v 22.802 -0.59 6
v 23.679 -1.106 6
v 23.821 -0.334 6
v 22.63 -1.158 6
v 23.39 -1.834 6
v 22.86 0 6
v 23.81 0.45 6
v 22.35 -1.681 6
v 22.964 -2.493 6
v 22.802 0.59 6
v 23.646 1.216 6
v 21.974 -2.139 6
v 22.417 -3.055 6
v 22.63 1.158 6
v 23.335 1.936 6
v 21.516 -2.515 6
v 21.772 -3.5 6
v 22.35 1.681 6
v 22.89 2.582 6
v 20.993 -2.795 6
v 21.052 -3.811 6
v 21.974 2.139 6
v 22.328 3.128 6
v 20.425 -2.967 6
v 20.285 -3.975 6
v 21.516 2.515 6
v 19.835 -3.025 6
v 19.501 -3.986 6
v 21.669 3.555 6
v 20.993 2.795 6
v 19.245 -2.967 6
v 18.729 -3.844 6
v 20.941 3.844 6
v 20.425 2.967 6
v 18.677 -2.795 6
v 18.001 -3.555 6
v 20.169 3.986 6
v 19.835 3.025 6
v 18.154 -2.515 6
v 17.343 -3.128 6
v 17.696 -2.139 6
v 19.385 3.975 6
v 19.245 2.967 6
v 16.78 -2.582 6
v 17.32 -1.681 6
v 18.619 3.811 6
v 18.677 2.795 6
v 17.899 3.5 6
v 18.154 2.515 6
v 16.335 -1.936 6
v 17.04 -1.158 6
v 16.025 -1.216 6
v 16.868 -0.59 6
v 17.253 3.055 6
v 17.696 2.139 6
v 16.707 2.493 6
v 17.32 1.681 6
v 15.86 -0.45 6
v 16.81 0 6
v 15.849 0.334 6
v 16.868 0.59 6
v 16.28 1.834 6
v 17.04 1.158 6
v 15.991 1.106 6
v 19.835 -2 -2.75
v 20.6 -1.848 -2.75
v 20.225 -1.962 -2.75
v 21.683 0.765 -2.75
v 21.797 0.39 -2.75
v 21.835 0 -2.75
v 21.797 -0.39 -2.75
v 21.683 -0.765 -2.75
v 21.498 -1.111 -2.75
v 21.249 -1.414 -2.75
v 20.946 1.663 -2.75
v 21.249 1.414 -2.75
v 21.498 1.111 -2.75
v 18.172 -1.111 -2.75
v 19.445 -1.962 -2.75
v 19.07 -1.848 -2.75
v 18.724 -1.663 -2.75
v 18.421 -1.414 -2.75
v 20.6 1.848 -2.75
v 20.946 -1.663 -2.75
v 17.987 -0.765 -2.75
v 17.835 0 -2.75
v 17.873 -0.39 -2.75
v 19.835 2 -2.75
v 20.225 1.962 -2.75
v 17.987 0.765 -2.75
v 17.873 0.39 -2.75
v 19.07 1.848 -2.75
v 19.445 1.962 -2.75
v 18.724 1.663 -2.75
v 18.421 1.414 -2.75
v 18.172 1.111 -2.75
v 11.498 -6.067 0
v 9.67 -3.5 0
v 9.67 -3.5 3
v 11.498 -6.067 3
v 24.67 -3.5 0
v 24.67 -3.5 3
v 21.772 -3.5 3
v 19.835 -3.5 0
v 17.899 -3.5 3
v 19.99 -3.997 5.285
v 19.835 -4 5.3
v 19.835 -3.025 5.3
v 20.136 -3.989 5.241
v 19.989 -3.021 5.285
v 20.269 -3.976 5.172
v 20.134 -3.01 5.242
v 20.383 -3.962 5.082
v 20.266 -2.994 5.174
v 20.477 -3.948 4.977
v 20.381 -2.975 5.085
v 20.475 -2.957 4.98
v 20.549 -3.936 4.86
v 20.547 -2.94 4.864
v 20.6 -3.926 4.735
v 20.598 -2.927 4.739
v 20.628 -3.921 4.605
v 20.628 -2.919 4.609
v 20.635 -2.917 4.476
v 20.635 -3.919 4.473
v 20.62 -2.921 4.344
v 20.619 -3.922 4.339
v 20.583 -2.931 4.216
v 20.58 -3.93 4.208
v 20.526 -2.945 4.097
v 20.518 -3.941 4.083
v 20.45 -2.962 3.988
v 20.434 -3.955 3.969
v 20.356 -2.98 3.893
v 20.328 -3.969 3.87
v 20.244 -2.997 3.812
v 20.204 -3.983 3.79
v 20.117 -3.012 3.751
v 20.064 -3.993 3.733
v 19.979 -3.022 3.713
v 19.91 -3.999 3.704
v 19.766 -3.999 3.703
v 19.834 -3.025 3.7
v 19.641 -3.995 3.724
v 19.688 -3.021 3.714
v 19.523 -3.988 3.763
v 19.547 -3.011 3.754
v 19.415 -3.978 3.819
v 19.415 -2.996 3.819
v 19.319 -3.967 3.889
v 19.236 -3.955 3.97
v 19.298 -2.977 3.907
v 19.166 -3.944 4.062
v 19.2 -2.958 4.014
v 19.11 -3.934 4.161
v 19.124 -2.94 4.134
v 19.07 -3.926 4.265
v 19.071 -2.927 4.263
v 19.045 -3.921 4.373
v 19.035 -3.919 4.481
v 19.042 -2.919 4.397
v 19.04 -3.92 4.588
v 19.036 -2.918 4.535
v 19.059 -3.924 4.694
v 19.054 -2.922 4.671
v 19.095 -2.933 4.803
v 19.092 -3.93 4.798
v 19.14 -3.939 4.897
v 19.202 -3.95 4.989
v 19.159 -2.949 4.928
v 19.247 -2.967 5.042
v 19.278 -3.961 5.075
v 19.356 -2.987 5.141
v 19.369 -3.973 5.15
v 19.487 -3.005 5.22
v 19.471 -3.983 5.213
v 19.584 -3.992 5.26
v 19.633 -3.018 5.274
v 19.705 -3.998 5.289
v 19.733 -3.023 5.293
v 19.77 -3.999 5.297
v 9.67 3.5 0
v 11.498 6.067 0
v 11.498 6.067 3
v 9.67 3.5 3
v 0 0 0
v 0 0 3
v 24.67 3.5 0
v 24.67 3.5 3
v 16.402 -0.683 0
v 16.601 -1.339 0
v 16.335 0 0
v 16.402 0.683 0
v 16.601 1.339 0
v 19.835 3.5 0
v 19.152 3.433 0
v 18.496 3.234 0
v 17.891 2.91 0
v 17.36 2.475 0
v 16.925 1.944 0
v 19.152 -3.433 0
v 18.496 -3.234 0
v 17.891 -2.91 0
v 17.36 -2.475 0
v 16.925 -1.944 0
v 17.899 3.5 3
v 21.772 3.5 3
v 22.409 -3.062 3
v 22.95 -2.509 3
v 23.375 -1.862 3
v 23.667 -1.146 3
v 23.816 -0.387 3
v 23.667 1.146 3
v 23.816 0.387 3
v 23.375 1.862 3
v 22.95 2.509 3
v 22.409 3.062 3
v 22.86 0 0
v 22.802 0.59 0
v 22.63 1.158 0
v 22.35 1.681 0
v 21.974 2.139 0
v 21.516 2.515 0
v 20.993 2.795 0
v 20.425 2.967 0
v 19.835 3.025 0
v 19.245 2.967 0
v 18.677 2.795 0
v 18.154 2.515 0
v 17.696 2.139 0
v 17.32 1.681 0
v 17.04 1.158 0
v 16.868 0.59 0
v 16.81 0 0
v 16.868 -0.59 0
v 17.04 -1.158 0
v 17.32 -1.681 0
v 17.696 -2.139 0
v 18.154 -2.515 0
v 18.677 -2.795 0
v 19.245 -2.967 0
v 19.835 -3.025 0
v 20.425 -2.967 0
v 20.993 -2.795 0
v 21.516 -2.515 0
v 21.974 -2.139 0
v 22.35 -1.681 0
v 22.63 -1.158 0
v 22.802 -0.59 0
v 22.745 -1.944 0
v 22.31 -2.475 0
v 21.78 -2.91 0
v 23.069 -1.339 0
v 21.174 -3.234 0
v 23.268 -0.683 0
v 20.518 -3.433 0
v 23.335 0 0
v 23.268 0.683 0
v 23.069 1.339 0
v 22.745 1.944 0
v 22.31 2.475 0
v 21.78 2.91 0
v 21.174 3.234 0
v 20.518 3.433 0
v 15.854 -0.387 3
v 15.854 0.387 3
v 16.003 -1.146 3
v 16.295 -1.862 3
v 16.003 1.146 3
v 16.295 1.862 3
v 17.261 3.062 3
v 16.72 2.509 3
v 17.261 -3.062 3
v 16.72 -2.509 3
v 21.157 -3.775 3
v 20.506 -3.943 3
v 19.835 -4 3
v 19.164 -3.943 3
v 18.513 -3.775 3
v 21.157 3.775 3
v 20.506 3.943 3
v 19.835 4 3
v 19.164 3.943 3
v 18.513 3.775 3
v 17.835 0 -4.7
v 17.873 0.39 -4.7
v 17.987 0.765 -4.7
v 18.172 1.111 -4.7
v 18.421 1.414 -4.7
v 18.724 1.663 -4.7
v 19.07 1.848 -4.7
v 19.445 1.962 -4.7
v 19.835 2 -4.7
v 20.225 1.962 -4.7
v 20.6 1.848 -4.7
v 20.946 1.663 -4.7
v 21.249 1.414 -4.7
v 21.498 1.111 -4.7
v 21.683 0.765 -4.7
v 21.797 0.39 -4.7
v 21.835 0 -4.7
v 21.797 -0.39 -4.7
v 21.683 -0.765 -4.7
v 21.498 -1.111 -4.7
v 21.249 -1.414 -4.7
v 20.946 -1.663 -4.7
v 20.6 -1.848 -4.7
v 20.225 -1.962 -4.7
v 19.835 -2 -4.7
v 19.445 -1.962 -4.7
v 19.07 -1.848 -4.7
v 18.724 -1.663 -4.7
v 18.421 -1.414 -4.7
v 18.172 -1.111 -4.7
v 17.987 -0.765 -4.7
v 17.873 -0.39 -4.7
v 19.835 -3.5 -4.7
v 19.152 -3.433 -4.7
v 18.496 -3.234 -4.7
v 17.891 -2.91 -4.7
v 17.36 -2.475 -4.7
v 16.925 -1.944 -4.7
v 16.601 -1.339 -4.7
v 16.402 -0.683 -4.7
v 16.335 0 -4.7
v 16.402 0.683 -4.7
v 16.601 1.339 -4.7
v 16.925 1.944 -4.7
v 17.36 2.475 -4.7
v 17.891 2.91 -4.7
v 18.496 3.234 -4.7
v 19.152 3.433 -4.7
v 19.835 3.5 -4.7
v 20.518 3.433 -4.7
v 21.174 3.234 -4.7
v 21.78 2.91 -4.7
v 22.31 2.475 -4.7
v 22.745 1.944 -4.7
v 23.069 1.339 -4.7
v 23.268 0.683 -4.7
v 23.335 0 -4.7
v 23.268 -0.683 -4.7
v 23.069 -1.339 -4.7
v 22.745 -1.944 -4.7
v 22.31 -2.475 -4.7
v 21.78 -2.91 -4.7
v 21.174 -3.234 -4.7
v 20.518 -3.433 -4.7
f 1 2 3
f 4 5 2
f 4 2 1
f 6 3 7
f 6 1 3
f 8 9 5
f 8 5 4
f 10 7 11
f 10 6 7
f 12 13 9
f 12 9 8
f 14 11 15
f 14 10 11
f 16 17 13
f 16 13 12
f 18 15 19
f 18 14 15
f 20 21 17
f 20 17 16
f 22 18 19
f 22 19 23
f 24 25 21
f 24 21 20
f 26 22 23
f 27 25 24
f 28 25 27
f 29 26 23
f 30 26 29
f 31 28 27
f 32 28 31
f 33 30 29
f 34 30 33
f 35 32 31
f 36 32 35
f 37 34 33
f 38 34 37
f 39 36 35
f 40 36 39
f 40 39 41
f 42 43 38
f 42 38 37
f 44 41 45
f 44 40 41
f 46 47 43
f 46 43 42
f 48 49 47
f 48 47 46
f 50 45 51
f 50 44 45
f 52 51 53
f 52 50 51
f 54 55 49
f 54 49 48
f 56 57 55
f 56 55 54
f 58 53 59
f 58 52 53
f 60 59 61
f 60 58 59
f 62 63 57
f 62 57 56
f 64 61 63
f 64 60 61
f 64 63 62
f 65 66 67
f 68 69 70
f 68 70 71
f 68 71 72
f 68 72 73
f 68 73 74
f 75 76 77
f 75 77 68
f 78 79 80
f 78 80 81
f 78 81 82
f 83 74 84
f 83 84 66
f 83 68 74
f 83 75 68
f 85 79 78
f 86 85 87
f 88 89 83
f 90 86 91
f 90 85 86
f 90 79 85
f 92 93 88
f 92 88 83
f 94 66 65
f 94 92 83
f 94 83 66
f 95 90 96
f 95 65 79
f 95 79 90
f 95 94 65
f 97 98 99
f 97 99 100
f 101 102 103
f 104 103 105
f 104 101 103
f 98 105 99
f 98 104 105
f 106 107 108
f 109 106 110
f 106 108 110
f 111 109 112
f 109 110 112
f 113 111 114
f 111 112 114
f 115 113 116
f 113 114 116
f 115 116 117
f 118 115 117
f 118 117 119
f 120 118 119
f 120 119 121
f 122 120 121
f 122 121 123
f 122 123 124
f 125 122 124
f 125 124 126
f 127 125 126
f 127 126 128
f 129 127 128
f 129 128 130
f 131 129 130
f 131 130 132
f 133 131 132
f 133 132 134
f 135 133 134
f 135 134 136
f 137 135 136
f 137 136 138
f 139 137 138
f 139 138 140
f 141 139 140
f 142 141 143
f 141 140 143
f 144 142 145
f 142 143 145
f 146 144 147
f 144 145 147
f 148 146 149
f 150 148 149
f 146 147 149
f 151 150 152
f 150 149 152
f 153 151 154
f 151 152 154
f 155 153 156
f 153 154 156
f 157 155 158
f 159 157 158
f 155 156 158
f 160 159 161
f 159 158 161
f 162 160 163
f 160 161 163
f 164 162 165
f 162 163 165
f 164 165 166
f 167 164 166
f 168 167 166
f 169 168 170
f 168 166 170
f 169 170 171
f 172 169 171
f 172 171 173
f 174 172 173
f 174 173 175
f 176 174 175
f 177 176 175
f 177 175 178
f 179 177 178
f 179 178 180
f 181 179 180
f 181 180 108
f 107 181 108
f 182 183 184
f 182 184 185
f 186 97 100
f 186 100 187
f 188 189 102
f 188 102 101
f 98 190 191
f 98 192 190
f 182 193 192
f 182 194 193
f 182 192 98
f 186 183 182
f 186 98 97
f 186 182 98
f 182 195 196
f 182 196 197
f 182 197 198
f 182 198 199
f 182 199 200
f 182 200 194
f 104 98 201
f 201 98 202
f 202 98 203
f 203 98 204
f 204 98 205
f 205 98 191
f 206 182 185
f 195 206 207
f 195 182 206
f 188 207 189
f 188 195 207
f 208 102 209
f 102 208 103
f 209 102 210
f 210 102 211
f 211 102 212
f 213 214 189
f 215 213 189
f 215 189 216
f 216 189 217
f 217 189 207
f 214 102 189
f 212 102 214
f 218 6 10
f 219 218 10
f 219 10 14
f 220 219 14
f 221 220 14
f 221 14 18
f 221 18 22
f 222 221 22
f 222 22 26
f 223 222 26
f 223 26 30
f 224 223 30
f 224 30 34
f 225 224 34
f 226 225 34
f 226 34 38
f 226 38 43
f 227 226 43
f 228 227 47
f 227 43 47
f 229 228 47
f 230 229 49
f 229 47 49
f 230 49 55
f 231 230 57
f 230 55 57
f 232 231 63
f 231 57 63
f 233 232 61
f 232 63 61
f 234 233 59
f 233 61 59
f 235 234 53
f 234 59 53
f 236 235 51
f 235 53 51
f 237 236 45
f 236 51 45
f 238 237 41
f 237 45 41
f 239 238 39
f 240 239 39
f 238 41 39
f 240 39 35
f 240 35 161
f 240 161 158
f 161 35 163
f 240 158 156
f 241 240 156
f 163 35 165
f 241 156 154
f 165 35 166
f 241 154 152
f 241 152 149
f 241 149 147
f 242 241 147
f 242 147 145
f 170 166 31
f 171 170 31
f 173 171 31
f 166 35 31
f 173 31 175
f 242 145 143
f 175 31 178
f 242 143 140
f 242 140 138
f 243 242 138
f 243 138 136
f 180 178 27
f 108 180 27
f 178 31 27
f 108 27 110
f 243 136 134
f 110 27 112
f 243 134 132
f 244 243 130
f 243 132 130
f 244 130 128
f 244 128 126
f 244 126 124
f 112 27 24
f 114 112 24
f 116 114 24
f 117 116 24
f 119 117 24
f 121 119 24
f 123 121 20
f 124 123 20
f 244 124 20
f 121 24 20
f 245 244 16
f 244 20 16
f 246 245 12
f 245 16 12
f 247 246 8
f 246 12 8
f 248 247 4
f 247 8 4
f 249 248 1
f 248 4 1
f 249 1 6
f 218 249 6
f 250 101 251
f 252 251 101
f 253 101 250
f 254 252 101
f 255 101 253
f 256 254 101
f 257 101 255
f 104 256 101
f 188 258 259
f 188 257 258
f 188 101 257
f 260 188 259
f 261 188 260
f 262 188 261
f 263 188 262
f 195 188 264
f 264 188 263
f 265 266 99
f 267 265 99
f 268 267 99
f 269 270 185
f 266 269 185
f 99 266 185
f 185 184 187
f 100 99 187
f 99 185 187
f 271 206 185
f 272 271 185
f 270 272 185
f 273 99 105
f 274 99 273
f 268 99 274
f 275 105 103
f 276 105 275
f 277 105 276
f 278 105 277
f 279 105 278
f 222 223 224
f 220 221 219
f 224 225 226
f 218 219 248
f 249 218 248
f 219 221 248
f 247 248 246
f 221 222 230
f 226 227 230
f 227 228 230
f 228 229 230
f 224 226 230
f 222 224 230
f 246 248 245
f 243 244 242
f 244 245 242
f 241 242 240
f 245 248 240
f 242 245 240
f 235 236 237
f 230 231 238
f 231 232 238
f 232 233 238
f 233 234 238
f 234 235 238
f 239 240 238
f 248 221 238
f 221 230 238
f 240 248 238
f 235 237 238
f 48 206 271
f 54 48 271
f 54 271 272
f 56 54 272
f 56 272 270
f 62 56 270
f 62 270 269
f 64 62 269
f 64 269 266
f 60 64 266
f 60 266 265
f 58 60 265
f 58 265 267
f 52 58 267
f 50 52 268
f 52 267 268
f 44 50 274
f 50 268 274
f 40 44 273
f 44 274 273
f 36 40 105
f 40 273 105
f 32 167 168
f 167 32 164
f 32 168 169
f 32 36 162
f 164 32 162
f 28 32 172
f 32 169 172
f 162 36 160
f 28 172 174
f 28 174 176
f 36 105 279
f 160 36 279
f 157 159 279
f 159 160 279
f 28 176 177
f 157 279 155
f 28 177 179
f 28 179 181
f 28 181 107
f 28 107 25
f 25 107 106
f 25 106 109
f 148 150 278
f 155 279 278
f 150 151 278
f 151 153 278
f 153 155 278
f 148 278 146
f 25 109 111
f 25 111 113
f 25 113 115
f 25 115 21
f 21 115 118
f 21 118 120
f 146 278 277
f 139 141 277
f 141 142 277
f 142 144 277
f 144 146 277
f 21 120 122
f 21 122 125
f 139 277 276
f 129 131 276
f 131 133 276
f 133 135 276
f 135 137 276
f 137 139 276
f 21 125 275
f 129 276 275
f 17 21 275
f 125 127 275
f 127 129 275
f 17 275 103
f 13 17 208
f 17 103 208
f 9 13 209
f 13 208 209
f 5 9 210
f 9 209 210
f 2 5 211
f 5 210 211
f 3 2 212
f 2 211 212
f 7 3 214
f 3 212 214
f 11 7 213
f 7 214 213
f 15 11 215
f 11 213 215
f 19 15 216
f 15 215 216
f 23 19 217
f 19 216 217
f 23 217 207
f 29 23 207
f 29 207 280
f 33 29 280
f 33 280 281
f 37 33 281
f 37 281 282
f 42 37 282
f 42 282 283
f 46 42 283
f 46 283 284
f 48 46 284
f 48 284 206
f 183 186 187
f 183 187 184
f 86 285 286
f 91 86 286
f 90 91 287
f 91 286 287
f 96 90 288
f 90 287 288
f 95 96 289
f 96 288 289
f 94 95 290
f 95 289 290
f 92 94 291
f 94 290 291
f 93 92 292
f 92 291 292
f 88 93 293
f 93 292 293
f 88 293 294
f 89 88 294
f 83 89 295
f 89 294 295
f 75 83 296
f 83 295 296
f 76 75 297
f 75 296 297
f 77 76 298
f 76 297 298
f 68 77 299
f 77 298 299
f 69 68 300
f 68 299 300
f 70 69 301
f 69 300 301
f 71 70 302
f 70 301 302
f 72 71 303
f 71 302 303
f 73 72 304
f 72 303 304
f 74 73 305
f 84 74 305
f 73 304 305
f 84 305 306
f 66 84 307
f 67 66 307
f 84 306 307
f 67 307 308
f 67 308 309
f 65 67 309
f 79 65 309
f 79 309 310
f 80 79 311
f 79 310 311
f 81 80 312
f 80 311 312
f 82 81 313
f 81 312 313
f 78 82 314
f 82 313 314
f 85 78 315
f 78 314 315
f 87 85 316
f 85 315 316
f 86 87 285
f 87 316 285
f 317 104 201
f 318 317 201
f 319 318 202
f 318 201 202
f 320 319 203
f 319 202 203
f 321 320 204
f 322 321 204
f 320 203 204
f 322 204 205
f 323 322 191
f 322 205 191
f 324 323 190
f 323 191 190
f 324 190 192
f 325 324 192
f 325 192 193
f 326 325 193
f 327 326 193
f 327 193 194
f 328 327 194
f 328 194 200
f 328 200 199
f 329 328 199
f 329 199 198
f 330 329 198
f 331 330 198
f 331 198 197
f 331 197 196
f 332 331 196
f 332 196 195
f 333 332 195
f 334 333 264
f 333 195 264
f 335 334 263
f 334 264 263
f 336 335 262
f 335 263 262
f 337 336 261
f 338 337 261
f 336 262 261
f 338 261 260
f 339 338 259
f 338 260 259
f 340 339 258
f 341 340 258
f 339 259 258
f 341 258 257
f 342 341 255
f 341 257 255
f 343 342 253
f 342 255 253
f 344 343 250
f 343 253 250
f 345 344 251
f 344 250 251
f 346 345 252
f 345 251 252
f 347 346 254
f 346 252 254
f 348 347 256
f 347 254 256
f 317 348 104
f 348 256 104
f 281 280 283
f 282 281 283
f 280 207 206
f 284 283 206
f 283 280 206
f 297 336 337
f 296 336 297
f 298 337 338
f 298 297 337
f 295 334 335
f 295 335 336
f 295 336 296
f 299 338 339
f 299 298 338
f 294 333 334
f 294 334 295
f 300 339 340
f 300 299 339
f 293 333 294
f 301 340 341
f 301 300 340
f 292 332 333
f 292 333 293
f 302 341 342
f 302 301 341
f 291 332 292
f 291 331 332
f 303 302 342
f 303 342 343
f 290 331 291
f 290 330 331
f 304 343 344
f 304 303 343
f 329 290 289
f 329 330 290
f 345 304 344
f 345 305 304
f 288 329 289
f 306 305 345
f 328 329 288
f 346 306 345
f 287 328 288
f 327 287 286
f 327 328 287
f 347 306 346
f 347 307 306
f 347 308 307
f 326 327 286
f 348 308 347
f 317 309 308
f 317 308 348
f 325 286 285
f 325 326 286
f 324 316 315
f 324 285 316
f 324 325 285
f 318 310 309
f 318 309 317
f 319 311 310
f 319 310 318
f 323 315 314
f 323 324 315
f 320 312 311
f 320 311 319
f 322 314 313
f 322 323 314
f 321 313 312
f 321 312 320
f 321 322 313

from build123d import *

# Parameters (mm, degrees)
BOSS_EXTRUDE1_DEPTH     = 3
SKETCH8_R               = 4
BOSS_EXTRUDE4_DEPTH     = 3
CUT_EXTRUDE5_REACH      = 42.577
SKETCH9_R               = 3.025
CUT_EXTRUDE6_REACH      = 42.577
CUT_EXTRUDE6_END_RADIUS = 4
SKETCH10_R              = 0.8
SKETCH11_R              = 3.5
BOSS_EXTRUDE5_DEPTH     = 4.7
SKETCH12_R              = 2
CUT_EXTRUDE7_DEPTH      = 1.95
SKETCH13_W              = 3
SKETCH13_H              = 7
CUT_EXTRUDE8_DEPTH      = 15


with BuildPart() as part:
    # Sketch3 → Boss-Extrude1 (new body)
    with BuildSketch(Plane.XY):
        Polygon((0, 0), (11.497632607, 6.066666667), (9.670080369, 3.5), (39.670080369, 3.5), (39.670080369, -3.5), (9.670080369, -3.5), (11.497632607, -6.066666667), align=None)
    extrude(amount=BOSS_EXTRUDE1_DEPTH)

    # Sketch8 → Boss-Extrude4 (add)
    with BuildSketch(Plane.XY.offset(3)):
        with Locations(Location((19.835040185, 0, 0), (0, 0, 118.955024372))):
            Circle(SKETCH8_R)
    extrude(amount=BOSS_EXTRUDE4_DEPTH)

    # Sketch9 → Cut-Extrude5 (cut, up to next)
    with BuildSketch(Plane.XY.offset(6), mode=Mode.PRIVATE) as cut_extrude5_sk1:
        with Locations((19.835040185, 0)):
            Circle(SKETCH9_R)
    cut_extrude5_tool1 = extrude(cut_extrude5_sk1.sketch, amount=-CUT_EXTRUDE5_REACH, mode=Mode.PRIVATE) & part.part
    add(cut_extrude5_tool1.solids().sort_by_distance((19.83504, 0, 6))[0], mode=Mode.SUBTRACT)

    # Cut-Extrude6: up to this cylinder (the profile starts inside it)
    cut_extrude6_end = Plane(origin=(19.835040185, 0, 4.5), z_dir=(0, 0, -1)) * Cylinder(CUT_EXTRUDE6_END_RADIUS, 94.154, mode=Mode.PRIVATE)
    # Sketch10 → Cut-Extrude6 (cut, up to the surface)
    with BuildSketch(Plane(origin=(0, 0, 0), x_dir=(1, 0, 0), z_dir=(0, 1, 0)), mode=Mode.PRIVATE) as cut_extrude6_sk1:
        with Locations(Location((19.835040185, -4.5, 0), (0, 0, 270))):
            Circle(SKETCH10_R)
    cut_extrude6_tool1 = extrude(cut_extrude6_sk1.sketch, amount=-CUT_EXTRUDE6_REACH, mode=Mode.PRIVATE) & cut_extrude6_end
    add(cut_extrude6_tool1.solids().sort_by_distance((19.83504, 0, 4.5))[0], mode=Mode.SUBTRACT)

    # Sketch11 → Boss-Extrude5 (add)
    with BuildSketch(Plane(origin=(0, 0, 0), x_dir=(-1, 0, 0), z_dir=(0, 0, -1))):
        with Locations(Location((-19.835040185, 0, 0), (0, 0, 270))):
            Circle(SKETCH11_R)
    extrude(amount=BOSS_EXTRUDE5_DEPTH)

    # Sketch12 → Cut-Extrude7 (cut)
    with BuildSketch(Plane(origin=(0, 0, -4.7), x_dir=(-1, 0, 0), z_dir=(0, 0, -1))):
        with Locations((-19.835040185, 0)):
            Circle(SKETCH12_R)
    extrude(amount=-CUT_EXTRUDE7_DEPTH, mode=Mode.SUBTRACT)

    # Sketch13 → Cut-Extrude8 (cut)
    with BuildSketch(Plane(origin=(39.670080369, 0, 0), x_dir=(0, 0, -1), z_dir=(1, 0, 0))):
        with Locations((-1.5, 0)):
            Rectangle(SKETCH13_W, SKETCH13_H)
    extrude(amount=-CUT_EXTRUDE8_DEPTH, mode=Mode.SUBTRACT)


solid = part.part
